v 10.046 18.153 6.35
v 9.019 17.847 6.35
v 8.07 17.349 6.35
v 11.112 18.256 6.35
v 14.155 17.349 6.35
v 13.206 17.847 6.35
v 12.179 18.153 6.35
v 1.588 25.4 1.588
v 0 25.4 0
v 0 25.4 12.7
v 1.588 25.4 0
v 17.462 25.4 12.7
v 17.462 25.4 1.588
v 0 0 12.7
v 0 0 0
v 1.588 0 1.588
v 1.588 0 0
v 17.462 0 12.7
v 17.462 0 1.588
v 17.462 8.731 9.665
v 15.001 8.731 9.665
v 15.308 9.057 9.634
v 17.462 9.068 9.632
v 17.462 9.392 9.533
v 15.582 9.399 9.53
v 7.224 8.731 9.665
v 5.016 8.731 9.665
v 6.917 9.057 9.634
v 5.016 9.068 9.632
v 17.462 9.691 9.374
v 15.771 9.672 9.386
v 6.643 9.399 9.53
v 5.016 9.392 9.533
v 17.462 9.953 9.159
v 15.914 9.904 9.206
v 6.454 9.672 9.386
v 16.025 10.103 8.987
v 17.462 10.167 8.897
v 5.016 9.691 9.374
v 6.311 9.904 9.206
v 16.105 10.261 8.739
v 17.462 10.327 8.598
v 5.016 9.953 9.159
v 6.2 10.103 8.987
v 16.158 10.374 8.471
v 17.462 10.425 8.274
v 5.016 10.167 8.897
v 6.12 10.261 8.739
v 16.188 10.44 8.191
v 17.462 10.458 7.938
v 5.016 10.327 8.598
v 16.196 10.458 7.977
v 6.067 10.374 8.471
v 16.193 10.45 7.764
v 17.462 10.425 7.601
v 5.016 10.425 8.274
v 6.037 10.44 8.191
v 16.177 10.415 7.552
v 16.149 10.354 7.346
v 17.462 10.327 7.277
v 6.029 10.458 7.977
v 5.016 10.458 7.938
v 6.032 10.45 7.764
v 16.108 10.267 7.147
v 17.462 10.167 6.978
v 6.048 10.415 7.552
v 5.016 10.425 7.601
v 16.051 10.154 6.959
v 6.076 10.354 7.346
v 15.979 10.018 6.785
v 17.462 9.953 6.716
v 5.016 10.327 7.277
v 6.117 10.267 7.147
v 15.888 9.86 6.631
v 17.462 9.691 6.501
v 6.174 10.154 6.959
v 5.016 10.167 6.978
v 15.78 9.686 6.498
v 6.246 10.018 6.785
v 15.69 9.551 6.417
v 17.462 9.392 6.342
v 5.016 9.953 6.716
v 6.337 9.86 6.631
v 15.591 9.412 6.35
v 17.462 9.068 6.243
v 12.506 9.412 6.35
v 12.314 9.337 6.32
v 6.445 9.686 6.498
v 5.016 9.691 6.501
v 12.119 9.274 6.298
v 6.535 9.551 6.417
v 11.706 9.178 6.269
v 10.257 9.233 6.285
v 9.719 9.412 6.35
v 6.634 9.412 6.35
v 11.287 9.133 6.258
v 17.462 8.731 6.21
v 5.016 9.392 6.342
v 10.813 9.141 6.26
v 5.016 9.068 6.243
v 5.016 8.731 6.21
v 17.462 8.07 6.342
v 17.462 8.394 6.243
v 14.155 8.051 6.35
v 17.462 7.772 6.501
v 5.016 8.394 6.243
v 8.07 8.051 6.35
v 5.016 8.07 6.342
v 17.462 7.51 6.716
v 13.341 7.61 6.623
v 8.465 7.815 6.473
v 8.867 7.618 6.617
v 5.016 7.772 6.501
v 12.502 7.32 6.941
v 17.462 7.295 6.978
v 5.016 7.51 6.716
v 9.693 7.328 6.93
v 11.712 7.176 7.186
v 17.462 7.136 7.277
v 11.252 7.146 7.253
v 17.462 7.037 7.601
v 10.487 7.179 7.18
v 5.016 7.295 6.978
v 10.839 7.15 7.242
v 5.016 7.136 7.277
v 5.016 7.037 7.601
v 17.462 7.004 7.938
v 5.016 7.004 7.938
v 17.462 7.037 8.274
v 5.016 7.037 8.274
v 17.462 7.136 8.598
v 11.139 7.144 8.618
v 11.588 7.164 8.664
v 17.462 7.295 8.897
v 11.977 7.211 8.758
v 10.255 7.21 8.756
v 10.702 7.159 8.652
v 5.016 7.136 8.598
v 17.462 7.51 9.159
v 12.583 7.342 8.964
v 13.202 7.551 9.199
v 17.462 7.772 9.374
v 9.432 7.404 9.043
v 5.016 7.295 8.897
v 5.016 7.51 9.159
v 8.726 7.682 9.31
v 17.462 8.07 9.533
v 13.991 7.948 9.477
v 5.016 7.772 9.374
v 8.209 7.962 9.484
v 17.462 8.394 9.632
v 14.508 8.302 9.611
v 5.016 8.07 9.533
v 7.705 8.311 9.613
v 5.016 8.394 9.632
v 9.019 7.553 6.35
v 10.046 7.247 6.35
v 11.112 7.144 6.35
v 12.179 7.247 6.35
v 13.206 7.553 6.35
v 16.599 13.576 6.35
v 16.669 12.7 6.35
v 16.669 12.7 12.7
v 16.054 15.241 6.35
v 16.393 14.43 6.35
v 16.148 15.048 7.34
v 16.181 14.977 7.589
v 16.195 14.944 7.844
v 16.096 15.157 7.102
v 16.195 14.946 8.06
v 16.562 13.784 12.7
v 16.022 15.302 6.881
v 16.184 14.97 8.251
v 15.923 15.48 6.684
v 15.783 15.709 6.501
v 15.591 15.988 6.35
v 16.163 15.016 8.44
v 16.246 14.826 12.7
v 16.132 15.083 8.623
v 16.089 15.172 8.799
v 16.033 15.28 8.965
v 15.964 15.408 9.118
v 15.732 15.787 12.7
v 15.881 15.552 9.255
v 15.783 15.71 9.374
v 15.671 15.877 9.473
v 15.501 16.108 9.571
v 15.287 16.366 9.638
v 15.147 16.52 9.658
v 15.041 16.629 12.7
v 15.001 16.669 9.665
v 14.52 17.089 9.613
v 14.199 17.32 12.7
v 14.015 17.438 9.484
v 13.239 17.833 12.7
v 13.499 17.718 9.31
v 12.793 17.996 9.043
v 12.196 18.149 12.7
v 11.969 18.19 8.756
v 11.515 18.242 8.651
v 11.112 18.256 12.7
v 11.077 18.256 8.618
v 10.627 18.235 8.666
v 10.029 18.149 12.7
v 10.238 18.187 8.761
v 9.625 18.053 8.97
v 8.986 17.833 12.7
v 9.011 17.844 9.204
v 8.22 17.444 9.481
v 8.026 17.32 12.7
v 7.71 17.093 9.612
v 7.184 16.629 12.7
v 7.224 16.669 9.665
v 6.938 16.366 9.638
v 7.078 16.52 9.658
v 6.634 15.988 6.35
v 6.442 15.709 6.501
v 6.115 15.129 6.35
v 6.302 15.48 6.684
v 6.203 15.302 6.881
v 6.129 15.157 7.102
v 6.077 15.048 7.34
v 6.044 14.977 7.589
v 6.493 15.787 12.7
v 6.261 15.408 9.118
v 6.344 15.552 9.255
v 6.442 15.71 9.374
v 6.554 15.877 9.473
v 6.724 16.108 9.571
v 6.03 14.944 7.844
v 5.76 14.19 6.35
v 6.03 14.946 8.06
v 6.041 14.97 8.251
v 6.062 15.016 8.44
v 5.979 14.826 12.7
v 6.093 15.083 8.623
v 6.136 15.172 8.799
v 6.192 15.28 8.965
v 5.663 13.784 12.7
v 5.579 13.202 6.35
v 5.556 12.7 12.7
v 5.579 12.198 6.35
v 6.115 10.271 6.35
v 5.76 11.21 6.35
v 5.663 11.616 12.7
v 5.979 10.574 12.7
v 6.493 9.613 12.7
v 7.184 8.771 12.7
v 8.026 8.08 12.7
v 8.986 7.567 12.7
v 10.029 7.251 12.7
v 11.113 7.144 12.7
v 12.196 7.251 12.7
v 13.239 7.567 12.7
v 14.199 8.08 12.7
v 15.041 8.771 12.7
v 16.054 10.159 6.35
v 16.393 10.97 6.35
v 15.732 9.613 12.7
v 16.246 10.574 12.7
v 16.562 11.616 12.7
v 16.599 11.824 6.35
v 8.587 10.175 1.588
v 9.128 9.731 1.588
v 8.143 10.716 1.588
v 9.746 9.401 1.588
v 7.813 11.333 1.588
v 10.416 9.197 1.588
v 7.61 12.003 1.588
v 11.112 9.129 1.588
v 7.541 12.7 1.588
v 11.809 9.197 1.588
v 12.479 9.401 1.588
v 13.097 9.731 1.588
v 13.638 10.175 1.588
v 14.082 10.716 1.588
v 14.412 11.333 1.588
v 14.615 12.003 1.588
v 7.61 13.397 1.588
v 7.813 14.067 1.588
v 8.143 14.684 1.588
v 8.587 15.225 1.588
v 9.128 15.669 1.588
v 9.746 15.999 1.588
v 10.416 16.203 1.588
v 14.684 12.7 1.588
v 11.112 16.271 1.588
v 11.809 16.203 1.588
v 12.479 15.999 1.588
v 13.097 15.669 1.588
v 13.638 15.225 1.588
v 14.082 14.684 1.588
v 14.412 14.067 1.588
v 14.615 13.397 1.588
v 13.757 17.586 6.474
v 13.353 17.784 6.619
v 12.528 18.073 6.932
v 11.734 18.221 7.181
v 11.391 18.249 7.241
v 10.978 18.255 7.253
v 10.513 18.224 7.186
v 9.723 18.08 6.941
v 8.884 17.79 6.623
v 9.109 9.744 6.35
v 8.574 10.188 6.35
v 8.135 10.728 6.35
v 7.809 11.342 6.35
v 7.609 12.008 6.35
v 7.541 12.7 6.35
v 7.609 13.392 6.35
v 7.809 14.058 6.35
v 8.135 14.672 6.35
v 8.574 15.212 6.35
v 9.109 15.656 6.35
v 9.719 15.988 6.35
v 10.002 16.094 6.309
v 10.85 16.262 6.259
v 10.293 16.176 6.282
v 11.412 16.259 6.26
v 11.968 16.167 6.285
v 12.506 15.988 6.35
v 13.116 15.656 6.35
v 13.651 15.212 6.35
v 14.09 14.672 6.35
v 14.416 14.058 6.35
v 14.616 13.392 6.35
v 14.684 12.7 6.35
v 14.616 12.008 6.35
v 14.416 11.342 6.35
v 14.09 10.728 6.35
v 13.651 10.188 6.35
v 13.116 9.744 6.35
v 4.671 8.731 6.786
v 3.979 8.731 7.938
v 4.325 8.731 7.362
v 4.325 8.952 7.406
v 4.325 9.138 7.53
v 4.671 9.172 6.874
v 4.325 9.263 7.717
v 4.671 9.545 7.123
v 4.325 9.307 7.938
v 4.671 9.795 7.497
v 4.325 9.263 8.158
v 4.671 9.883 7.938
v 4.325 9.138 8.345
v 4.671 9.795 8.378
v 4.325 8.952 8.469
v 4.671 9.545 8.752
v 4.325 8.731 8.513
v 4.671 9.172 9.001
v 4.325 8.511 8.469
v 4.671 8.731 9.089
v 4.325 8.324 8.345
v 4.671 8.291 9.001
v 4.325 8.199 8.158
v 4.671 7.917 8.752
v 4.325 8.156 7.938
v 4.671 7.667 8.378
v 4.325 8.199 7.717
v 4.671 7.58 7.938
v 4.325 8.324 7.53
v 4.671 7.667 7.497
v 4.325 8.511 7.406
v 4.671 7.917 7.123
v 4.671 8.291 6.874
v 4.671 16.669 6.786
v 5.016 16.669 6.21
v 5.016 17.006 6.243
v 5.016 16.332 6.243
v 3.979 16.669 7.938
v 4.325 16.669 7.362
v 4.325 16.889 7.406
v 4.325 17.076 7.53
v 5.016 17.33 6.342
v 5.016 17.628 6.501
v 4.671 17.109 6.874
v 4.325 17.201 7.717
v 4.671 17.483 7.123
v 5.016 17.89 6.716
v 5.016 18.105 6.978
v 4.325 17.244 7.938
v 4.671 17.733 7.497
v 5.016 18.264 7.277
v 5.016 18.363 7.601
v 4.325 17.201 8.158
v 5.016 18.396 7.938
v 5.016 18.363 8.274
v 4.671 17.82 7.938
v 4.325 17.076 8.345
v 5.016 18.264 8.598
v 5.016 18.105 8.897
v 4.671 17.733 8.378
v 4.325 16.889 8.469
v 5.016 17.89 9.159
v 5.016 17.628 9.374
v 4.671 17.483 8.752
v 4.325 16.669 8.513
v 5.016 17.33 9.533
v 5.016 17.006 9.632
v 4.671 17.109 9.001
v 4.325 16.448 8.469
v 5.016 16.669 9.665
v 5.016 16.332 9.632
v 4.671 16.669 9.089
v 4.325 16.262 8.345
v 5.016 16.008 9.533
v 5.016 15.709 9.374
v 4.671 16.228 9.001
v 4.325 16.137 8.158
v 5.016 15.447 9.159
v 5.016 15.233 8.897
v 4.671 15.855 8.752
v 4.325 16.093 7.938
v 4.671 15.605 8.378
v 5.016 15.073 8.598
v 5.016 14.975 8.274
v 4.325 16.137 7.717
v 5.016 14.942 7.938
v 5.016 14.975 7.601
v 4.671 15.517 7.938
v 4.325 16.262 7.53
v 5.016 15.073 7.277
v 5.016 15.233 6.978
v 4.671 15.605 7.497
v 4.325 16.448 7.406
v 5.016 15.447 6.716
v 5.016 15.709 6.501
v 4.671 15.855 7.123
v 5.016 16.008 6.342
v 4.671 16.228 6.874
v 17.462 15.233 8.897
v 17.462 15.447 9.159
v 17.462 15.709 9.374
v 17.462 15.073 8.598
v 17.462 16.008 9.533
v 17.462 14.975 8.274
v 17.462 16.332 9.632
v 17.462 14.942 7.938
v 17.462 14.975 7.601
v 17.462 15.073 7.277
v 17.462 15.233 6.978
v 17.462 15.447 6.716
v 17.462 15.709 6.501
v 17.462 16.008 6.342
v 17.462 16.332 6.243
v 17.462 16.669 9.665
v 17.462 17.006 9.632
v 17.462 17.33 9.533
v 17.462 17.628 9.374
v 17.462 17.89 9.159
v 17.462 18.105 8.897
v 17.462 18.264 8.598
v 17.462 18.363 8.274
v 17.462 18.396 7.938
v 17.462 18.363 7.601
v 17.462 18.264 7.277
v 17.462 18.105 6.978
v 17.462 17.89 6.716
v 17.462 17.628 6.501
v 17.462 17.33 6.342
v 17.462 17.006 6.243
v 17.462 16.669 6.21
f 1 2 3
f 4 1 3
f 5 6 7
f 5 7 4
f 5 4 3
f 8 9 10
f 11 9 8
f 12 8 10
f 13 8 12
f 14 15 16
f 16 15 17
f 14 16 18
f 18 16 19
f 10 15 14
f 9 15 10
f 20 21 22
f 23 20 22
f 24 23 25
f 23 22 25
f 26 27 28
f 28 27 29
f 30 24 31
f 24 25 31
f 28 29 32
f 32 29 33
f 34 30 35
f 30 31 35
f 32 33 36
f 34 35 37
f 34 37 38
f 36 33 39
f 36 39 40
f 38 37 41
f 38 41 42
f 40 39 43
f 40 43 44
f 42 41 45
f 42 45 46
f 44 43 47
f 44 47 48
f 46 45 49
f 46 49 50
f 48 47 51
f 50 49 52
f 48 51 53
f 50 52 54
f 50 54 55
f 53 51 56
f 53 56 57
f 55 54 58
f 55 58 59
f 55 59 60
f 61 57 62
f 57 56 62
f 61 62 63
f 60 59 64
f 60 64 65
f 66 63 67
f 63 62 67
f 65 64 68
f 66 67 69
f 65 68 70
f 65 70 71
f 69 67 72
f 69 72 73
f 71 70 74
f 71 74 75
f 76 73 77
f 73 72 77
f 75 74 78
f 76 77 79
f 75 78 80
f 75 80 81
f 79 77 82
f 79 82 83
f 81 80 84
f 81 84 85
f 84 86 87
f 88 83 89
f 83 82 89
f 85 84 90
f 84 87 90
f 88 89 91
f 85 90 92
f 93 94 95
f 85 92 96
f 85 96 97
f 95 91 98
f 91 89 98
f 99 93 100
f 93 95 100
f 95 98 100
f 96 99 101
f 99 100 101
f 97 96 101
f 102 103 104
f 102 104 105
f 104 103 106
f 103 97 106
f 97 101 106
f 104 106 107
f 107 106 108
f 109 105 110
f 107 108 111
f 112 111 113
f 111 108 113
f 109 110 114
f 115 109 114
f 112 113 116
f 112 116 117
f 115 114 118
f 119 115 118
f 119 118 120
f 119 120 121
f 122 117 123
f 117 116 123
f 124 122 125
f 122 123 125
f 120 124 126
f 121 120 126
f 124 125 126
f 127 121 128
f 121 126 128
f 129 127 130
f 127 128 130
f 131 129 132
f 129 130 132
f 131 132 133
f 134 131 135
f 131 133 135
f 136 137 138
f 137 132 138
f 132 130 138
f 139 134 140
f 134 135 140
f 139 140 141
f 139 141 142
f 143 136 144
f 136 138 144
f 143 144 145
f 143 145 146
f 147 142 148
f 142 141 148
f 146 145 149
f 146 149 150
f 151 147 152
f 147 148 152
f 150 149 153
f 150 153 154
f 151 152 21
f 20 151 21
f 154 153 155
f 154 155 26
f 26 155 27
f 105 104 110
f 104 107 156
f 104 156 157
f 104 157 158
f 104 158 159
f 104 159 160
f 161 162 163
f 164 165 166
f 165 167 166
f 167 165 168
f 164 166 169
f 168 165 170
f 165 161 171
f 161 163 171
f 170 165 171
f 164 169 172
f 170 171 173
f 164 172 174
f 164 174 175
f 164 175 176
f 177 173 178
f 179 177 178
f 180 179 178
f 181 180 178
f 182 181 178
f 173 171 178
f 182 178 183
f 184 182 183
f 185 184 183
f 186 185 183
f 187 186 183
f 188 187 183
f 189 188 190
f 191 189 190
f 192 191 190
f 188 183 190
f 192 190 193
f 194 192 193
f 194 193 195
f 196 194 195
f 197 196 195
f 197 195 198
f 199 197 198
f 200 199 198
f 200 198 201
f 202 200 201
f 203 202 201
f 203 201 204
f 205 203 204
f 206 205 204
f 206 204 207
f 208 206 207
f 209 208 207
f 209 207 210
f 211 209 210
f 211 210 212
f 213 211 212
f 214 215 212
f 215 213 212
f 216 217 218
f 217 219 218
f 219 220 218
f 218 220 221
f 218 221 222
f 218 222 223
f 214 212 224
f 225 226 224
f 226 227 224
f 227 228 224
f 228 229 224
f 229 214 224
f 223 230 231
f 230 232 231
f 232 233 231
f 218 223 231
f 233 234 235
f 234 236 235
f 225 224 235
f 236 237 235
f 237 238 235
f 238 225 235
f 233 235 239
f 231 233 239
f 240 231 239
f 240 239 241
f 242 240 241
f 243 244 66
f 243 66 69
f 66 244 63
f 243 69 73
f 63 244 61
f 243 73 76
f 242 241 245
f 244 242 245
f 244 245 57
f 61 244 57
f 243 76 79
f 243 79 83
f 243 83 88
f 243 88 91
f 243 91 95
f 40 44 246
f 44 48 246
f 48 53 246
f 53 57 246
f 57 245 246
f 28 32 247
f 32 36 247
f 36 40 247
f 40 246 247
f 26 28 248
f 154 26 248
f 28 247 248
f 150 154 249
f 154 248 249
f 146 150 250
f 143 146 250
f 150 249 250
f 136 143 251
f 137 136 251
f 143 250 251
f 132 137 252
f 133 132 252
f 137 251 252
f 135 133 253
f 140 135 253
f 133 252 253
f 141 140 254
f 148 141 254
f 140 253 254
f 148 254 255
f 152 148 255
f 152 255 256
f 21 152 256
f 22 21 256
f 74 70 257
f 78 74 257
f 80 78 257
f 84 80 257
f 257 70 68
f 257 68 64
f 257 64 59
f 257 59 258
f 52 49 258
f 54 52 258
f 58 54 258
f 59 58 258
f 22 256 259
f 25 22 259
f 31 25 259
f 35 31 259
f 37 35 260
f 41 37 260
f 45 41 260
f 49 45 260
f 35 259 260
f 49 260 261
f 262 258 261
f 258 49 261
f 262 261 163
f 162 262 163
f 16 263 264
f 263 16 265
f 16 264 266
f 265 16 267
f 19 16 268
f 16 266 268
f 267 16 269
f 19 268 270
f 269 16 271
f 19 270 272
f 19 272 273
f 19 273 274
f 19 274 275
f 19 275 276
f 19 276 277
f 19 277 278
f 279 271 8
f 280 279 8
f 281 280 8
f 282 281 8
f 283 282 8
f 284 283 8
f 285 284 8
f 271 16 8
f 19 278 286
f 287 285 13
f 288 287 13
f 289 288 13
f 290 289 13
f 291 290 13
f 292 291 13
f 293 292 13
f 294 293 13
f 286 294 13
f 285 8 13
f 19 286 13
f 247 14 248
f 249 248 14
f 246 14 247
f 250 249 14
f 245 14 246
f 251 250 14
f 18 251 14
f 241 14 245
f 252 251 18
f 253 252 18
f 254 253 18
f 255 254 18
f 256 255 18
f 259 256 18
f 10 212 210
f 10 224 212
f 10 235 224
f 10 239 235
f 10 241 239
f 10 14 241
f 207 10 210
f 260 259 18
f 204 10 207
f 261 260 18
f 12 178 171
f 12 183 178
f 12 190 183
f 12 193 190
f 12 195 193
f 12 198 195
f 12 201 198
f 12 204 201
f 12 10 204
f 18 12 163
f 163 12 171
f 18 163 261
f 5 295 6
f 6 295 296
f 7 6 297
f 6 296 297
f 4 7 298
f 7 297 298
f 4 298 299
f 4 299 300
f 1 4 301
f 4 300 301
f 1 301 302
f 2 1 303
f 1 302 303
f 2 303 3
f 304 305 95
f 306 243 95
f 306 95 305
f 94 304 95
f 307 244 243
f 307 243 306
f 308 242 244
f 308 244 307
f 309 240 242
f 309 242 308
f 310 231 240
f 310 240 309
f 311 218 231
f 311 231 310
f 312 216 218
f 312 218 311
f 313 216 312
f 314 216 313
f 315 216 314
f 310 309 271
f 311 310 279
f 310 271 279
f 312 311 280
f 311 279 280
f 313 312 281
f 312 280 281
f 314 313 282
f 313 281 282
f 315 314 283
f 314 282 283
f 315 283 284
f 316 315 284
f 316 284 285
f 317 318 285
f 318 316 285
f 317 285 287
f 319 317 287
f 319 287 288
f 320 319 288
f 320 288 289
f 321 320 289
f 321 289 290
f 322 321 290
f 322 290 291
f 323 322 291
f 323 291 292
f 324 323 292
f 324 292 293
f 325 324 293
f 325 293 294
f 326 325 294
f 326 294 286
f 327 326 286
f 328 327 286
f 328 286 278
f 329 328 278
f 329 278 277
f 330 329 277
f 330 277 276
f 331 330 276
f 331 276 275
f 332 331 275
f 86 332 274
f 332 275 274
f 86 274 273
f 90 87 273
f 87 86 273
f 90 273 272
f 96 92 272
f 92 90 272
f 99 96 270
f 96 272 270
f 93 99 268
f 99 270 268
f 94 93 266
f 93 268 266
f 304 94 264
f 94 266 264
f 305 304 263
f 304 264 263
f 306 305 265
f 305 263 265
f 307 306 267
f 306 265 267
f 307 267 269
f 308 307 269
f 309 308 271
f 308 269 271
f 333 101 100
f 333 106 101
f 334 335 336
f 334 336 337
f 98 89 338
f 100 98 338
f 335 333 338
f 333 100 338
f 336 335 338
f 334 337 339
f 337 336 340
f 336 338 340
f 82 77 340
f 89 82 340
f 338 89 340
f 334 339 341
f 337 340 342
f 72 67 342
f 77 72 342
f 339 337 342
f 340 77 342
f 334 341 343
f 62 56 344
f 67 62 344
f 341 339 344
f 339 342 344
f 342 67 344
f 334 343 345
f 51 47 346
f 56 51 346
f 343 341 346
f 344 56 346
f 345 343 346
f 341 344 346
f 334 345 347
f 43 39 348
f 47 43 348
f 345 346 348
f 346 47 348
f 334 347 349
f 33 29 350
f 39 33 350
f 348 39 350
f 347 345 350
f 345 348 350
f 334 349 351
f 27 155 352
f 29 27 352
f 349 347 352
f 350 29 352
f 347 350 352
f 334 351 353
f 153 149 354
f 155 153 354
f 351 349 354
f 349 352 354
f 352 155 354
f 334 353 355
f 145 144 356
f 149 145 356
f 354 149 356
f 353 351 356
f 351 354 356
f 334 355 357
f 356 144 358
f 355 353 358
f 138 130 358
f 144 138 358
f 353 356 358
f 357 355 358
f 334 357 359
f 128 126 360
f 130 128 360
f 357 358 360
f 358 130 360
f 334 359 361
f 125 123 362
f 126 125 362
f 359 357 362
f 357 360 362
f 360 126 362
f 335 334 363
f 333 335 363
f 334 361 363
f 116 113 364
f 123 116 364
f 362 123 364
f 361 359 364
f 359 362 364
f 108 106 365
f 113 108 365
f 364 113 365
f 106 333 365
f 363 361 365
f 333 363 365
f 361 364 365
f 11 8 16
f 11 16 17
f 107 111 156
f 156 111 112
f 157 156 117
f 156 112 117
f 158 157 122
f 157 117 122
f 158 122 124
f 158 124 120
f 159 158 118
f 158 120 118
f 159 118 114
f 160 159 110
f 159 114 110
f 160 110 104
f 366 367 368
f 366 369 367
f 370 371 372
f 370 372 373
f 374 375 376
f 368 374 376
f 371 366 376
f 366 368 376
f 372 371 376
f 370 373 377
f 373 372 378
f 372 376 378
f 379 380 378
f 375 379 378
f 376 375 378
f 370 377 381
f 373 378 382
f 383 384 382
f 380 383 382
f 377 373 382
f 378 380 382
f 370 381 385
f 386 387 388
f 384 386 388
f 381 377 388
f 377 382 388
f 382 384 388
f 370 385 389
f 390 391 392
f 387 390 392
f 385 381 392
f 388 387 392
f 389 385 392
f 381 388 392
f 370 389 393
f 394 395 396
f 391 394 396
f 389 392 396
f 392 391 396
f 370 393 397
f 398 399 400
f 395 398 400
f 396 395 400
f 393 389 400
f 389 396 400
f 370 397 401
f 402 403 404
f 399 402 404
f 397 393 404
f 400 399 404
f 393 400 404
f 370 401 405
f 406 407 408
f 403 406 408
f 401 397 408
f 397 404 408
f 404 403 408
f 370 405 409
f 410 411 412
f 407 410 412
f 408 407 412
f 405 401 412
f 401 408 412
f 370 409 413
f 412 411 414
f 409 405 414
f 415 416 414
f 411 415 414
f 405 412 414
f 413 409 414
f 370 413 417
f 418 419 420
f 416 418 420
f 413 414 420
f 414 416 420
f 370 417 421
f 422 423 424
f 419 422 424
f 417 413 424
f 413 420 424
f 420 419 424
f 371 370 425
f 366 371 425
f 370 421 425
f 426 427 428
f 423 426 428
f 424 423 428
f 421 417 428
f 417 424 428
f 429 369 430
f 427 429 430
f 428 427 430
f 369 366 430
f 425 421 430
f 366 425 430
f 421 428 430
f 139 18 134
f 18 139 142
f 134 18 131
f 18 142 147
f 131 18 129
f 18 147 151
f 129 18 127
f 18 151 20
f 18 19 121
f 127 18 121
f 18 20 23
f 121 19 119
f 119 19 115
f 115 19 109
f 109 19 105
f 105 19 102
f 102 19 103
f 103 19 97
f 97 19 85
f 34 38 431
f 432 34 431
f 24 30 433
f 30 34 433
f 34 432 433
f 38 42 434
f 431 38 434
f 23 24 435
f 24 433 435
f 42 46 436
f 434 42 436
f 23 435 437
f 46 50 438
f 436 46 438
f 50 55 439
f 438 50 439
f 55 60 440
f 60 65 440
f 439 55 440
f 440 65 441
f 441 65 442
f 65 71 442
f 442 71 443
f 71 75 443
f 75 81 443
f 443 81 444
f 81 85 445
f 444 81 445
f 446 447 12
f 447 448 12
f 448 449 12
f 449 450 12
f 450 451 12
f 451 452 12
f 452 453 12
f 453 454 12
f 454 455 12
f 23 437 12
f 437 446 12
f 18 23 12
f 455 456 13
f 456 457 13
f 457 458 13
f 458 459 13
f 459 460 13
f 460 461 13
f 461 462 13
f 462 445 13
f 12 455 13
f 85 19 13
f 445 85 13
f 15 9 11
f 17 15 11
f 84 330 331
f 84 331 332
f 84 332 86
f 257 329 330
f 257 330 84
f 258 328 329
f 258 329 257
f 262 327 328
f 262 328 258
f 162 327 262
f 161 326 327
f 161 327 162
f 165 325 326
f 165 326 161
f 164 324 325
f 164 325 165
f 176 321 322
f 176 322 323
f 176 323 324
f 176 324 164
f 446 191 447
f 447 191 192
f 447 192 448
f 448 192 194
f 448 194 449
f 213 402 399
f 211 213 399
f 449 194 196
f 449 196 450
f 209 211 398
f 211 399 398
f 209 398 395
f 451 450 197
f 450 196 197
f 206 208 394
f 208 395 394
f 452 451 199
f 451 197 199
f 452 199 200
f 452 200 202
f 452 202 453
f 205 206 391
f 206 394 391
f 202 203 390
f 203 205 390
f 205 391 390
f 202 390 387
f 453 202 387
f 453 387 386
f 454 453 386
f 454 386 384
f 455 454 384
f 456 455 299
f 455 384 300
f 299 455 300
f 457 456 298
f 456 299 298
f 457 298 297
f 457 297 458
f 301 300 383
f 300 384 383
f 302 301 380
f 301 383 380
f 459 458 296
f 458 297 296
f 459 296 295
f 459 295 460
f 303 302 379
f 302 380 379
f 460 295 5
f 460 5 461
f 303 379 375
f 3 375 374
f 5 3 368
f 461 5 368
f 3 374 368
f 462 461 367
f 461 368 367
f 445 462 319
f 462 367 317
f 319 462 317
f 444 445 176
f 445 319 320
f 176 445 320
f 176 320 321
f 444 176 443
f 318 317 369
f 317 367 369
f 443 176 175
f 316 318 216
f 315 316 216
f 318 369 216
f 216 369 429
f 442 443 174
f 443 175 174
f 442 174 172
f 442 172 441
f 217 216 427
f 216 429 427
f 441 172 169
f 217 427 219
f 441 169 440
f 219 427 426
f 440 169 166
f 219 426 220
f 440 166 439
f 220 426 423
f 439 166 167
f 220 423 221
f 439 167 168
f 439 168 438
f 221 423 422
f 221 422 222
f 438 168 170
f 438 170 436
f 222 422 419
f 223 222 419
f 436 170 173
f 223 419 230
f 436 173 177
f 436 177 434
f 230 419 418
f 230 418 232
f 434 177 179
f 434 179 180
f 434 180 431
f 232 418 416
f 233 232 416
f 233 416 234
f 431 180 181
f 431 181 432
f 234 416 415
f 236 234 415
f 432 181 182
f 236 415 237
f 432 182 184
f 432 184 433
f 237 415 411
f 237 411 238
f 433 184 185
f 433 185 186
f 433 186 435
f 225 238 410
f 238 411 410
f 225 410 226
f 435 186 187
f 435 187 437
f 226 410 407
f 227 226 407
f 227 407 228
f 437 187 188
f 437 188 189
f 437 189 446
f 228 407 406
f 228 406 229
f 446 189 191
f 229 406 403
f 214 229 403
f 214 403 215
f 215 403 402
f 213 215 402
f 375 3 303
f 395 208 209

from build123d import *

# Parameters (mm, degrees)
SKETCH1_W                                        = 17.4625
SKETCH1_H                                        = 25.4
BOSS_EXTRUDE1_DEPTH                              = 12.7
SKETCH2_W                                        = 15.875
SKETCH2_H                                        = 1.5875
CUT_EXTRUDE1_DEPTH                               = 34.3375
F_8_32_TAPPED_HOLE1_D                            = 3.4544
F_8_32_TAPPED_HOLE1_DEPTH                        = 12.446
F_8_32_TAPPED_HOLE1_TIP                          = 1.037806461
CBORE_FOR_1_4_SOCKET_HEAD_CAP_SCREW1_D           = 7.14248
CBORE_FOR_1_4_SOCKET_HEAD_CAP_SCREW1_CBORE_D     = 11.1125
CBORE_FOR_1_4_SOCKET_HEAD_CAP_SCREW1_CBORE_DEPTH = 6.35


with BuildPart() as part:
    # Sketch1 → Boss-Extrude1 (new body)
    with BuildSketch(Plane.XY):
        with Locations((8.73125, 12.7)):
            Rectangle(SKETCH1_W, SKETCH1_H)
    extrude(amount=BOSS_EXTRUDE1_DEPTH)

    # Sketch2 → Cut-Extrude1 (cut, through all)
    with BuildSketch(Plane(origin=(0, 25.4, 0), x_dir=(1, 0, 0), z_dir=(0, 1, 0))):
        with Locations((9.525, -0.79375)):
            Rectangle(SKETCH2_W, SKETCH2_H)
    extrude(amount=-CUT_EXTRUDE1_DEPTH, mode=Mode.SUBTRACT)

    # #8-32 Tapped Hole1
    with Locations(Plane(origin=(17.4625, 0, 0), x_dir=(0, 0, -1), z_dir=(1, 0, 0))):
        with Locations((-7.9375, 16.66875), (-7.9375, 8.73125)):
            Hole(F_8_32_TAPPED_HOLE1_D / 2, depth=F_8_32_TAPPED_HOLE1_DEPTH)
            with Locations((0, 0, -(F_8_32_TAPPED_HOLE1_DEPTH + F_8_32_TAPPED_HOLE1_TIP / 2))):  # 118° drill point
                Cone(0, F_8_32_TAPPED_HOLE1_D / 2, F_8_32_TAPPED_HOLE1_TIP, mode=Mode.SUBTRACT)

    # CBORE for 1/4 Socket Head Cap Screw1 (through all)
    with Locations(Plane.XY.offset(12.7)):
        with Locations((11.1125, 12.7)):
            CounterBoreHole(CBORE_FOR_1_4_SOCKET_HEAD_CAP_SCREW1_D / 2, CBORE_FOR_1_4_SOCKET_HEAD_CAP_SCREW1_CBORE_D / 2, CBORE_FOR_1_4_SOCKET_HEAD_CAP_SCREW1_CBORE_DEPTH)


solid = part.part
